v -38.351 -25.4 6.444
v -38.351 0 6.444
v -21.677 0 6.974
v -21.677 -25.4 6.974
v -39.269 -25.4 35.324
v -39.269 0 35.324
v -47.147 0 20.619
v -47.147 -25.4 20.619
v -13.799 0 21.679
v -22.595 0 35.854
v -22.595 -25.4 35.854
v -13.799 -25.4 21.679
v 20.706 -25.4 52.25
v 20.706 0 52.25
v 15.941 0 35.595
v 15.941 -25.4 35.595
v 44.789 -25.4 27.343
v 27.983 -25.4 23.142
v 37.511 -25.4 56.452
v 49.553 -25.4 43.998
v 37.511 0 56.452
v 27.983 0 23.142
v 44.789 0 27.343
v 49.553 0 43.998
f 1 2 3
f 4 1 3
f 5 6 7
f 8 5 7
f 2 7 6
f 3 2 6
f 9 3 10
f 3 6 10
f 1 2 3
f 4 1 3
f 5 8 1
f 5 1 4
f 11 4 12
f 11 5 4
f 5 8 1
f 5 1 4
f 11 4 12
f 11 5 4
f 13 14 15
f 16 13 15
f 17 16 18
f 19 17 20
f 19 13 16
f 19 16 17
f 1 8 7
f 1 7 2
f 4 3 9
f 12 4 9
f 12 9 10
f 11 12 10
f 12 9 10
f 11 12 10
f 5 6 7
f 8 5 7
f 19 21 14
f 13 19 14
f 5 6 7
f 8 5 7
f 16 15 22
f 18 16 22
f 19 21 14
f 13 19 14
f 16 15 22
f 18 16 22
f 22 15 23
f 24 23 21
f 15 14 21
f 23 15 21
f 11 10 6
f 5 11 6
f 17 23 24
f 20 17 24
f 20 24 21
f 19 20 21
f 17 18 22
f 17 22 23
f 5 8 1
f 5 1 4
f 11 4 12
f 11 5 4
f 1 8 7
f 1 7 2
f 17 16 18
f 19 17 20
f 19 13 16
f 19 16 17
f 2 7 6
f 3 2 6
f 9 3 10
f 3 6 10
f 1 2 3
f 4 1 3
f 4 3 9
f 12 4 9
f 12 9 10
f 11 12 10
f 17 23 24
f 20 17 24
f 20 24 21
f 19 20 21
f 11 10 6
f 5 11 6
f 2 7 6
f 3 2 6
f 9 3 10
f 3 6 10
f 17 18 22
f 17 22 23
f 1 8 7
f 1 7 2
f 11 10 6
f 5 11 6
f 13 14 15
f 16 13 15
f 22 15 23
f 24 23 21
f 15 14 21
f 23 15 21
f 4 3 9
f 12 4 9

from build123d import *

# Parameters (mm, degrees)
F1_DEPTH = 25.4
F2_DEPTH = 25.4
F3_DEPTH = 25.4


with BuildPart() as f1:
    # F0 (on Front) → F1 (new body)
    with BuildSketch(Plane.XZ):
        Polygon((-21.676847, 6.974296), (-13.799129, 21.679379), (-22.595246, 35.854225), (-39.269081, 35.323987), (-47.146799, 20.618904), (-38.350682, 6.444058), align=None)
    extrude(amount=F1_DEPTH)


with BuildPart() as f2:
    # F0 (on Front) → F2 (new body)
    with BuildSketch(Plane.XZ):
        Polygon((-21.676847, 6.974296), (-13.799129, 21.679379), (-22.595246, 35.854225), (-39.269081, 35.323987), (-47.146799, 20.618904), (-38.350682, 6.444058), align=None)
        Polygon((27.982724, 23.141803), (44.788527, 27.343253), (49.552867, 43.99823), (37.511404, 56.451758), (20.7056, 52.250309), (15.94126, 35.595332), align=None)
    extrude(amount=F2_DEPTH)


with BuildPart() as f3:
    # F0 (on Front) → F3 (new body)
    with BuildSketch(Plane.XZ):
        Polygon((-21.676847, 6.974296), (-13.799129, 21.679379), (-22.595246, 35.854225), (-39.269081, 35.323987), (-47.146799, 20.618904), (-38.350682, 6.444058), align=None)
        Polygon((27.982724, 23.141803), (44.788527, 27.343253), (49.552867, 43.99823), (37.511404, 56.451758), (20.7056, 52.250309), (15.94126, 35.595332), align=None)
    extrude(amount=F3_DEPTH)


solid = Compound([f1.part, f2.part, f3.part])
